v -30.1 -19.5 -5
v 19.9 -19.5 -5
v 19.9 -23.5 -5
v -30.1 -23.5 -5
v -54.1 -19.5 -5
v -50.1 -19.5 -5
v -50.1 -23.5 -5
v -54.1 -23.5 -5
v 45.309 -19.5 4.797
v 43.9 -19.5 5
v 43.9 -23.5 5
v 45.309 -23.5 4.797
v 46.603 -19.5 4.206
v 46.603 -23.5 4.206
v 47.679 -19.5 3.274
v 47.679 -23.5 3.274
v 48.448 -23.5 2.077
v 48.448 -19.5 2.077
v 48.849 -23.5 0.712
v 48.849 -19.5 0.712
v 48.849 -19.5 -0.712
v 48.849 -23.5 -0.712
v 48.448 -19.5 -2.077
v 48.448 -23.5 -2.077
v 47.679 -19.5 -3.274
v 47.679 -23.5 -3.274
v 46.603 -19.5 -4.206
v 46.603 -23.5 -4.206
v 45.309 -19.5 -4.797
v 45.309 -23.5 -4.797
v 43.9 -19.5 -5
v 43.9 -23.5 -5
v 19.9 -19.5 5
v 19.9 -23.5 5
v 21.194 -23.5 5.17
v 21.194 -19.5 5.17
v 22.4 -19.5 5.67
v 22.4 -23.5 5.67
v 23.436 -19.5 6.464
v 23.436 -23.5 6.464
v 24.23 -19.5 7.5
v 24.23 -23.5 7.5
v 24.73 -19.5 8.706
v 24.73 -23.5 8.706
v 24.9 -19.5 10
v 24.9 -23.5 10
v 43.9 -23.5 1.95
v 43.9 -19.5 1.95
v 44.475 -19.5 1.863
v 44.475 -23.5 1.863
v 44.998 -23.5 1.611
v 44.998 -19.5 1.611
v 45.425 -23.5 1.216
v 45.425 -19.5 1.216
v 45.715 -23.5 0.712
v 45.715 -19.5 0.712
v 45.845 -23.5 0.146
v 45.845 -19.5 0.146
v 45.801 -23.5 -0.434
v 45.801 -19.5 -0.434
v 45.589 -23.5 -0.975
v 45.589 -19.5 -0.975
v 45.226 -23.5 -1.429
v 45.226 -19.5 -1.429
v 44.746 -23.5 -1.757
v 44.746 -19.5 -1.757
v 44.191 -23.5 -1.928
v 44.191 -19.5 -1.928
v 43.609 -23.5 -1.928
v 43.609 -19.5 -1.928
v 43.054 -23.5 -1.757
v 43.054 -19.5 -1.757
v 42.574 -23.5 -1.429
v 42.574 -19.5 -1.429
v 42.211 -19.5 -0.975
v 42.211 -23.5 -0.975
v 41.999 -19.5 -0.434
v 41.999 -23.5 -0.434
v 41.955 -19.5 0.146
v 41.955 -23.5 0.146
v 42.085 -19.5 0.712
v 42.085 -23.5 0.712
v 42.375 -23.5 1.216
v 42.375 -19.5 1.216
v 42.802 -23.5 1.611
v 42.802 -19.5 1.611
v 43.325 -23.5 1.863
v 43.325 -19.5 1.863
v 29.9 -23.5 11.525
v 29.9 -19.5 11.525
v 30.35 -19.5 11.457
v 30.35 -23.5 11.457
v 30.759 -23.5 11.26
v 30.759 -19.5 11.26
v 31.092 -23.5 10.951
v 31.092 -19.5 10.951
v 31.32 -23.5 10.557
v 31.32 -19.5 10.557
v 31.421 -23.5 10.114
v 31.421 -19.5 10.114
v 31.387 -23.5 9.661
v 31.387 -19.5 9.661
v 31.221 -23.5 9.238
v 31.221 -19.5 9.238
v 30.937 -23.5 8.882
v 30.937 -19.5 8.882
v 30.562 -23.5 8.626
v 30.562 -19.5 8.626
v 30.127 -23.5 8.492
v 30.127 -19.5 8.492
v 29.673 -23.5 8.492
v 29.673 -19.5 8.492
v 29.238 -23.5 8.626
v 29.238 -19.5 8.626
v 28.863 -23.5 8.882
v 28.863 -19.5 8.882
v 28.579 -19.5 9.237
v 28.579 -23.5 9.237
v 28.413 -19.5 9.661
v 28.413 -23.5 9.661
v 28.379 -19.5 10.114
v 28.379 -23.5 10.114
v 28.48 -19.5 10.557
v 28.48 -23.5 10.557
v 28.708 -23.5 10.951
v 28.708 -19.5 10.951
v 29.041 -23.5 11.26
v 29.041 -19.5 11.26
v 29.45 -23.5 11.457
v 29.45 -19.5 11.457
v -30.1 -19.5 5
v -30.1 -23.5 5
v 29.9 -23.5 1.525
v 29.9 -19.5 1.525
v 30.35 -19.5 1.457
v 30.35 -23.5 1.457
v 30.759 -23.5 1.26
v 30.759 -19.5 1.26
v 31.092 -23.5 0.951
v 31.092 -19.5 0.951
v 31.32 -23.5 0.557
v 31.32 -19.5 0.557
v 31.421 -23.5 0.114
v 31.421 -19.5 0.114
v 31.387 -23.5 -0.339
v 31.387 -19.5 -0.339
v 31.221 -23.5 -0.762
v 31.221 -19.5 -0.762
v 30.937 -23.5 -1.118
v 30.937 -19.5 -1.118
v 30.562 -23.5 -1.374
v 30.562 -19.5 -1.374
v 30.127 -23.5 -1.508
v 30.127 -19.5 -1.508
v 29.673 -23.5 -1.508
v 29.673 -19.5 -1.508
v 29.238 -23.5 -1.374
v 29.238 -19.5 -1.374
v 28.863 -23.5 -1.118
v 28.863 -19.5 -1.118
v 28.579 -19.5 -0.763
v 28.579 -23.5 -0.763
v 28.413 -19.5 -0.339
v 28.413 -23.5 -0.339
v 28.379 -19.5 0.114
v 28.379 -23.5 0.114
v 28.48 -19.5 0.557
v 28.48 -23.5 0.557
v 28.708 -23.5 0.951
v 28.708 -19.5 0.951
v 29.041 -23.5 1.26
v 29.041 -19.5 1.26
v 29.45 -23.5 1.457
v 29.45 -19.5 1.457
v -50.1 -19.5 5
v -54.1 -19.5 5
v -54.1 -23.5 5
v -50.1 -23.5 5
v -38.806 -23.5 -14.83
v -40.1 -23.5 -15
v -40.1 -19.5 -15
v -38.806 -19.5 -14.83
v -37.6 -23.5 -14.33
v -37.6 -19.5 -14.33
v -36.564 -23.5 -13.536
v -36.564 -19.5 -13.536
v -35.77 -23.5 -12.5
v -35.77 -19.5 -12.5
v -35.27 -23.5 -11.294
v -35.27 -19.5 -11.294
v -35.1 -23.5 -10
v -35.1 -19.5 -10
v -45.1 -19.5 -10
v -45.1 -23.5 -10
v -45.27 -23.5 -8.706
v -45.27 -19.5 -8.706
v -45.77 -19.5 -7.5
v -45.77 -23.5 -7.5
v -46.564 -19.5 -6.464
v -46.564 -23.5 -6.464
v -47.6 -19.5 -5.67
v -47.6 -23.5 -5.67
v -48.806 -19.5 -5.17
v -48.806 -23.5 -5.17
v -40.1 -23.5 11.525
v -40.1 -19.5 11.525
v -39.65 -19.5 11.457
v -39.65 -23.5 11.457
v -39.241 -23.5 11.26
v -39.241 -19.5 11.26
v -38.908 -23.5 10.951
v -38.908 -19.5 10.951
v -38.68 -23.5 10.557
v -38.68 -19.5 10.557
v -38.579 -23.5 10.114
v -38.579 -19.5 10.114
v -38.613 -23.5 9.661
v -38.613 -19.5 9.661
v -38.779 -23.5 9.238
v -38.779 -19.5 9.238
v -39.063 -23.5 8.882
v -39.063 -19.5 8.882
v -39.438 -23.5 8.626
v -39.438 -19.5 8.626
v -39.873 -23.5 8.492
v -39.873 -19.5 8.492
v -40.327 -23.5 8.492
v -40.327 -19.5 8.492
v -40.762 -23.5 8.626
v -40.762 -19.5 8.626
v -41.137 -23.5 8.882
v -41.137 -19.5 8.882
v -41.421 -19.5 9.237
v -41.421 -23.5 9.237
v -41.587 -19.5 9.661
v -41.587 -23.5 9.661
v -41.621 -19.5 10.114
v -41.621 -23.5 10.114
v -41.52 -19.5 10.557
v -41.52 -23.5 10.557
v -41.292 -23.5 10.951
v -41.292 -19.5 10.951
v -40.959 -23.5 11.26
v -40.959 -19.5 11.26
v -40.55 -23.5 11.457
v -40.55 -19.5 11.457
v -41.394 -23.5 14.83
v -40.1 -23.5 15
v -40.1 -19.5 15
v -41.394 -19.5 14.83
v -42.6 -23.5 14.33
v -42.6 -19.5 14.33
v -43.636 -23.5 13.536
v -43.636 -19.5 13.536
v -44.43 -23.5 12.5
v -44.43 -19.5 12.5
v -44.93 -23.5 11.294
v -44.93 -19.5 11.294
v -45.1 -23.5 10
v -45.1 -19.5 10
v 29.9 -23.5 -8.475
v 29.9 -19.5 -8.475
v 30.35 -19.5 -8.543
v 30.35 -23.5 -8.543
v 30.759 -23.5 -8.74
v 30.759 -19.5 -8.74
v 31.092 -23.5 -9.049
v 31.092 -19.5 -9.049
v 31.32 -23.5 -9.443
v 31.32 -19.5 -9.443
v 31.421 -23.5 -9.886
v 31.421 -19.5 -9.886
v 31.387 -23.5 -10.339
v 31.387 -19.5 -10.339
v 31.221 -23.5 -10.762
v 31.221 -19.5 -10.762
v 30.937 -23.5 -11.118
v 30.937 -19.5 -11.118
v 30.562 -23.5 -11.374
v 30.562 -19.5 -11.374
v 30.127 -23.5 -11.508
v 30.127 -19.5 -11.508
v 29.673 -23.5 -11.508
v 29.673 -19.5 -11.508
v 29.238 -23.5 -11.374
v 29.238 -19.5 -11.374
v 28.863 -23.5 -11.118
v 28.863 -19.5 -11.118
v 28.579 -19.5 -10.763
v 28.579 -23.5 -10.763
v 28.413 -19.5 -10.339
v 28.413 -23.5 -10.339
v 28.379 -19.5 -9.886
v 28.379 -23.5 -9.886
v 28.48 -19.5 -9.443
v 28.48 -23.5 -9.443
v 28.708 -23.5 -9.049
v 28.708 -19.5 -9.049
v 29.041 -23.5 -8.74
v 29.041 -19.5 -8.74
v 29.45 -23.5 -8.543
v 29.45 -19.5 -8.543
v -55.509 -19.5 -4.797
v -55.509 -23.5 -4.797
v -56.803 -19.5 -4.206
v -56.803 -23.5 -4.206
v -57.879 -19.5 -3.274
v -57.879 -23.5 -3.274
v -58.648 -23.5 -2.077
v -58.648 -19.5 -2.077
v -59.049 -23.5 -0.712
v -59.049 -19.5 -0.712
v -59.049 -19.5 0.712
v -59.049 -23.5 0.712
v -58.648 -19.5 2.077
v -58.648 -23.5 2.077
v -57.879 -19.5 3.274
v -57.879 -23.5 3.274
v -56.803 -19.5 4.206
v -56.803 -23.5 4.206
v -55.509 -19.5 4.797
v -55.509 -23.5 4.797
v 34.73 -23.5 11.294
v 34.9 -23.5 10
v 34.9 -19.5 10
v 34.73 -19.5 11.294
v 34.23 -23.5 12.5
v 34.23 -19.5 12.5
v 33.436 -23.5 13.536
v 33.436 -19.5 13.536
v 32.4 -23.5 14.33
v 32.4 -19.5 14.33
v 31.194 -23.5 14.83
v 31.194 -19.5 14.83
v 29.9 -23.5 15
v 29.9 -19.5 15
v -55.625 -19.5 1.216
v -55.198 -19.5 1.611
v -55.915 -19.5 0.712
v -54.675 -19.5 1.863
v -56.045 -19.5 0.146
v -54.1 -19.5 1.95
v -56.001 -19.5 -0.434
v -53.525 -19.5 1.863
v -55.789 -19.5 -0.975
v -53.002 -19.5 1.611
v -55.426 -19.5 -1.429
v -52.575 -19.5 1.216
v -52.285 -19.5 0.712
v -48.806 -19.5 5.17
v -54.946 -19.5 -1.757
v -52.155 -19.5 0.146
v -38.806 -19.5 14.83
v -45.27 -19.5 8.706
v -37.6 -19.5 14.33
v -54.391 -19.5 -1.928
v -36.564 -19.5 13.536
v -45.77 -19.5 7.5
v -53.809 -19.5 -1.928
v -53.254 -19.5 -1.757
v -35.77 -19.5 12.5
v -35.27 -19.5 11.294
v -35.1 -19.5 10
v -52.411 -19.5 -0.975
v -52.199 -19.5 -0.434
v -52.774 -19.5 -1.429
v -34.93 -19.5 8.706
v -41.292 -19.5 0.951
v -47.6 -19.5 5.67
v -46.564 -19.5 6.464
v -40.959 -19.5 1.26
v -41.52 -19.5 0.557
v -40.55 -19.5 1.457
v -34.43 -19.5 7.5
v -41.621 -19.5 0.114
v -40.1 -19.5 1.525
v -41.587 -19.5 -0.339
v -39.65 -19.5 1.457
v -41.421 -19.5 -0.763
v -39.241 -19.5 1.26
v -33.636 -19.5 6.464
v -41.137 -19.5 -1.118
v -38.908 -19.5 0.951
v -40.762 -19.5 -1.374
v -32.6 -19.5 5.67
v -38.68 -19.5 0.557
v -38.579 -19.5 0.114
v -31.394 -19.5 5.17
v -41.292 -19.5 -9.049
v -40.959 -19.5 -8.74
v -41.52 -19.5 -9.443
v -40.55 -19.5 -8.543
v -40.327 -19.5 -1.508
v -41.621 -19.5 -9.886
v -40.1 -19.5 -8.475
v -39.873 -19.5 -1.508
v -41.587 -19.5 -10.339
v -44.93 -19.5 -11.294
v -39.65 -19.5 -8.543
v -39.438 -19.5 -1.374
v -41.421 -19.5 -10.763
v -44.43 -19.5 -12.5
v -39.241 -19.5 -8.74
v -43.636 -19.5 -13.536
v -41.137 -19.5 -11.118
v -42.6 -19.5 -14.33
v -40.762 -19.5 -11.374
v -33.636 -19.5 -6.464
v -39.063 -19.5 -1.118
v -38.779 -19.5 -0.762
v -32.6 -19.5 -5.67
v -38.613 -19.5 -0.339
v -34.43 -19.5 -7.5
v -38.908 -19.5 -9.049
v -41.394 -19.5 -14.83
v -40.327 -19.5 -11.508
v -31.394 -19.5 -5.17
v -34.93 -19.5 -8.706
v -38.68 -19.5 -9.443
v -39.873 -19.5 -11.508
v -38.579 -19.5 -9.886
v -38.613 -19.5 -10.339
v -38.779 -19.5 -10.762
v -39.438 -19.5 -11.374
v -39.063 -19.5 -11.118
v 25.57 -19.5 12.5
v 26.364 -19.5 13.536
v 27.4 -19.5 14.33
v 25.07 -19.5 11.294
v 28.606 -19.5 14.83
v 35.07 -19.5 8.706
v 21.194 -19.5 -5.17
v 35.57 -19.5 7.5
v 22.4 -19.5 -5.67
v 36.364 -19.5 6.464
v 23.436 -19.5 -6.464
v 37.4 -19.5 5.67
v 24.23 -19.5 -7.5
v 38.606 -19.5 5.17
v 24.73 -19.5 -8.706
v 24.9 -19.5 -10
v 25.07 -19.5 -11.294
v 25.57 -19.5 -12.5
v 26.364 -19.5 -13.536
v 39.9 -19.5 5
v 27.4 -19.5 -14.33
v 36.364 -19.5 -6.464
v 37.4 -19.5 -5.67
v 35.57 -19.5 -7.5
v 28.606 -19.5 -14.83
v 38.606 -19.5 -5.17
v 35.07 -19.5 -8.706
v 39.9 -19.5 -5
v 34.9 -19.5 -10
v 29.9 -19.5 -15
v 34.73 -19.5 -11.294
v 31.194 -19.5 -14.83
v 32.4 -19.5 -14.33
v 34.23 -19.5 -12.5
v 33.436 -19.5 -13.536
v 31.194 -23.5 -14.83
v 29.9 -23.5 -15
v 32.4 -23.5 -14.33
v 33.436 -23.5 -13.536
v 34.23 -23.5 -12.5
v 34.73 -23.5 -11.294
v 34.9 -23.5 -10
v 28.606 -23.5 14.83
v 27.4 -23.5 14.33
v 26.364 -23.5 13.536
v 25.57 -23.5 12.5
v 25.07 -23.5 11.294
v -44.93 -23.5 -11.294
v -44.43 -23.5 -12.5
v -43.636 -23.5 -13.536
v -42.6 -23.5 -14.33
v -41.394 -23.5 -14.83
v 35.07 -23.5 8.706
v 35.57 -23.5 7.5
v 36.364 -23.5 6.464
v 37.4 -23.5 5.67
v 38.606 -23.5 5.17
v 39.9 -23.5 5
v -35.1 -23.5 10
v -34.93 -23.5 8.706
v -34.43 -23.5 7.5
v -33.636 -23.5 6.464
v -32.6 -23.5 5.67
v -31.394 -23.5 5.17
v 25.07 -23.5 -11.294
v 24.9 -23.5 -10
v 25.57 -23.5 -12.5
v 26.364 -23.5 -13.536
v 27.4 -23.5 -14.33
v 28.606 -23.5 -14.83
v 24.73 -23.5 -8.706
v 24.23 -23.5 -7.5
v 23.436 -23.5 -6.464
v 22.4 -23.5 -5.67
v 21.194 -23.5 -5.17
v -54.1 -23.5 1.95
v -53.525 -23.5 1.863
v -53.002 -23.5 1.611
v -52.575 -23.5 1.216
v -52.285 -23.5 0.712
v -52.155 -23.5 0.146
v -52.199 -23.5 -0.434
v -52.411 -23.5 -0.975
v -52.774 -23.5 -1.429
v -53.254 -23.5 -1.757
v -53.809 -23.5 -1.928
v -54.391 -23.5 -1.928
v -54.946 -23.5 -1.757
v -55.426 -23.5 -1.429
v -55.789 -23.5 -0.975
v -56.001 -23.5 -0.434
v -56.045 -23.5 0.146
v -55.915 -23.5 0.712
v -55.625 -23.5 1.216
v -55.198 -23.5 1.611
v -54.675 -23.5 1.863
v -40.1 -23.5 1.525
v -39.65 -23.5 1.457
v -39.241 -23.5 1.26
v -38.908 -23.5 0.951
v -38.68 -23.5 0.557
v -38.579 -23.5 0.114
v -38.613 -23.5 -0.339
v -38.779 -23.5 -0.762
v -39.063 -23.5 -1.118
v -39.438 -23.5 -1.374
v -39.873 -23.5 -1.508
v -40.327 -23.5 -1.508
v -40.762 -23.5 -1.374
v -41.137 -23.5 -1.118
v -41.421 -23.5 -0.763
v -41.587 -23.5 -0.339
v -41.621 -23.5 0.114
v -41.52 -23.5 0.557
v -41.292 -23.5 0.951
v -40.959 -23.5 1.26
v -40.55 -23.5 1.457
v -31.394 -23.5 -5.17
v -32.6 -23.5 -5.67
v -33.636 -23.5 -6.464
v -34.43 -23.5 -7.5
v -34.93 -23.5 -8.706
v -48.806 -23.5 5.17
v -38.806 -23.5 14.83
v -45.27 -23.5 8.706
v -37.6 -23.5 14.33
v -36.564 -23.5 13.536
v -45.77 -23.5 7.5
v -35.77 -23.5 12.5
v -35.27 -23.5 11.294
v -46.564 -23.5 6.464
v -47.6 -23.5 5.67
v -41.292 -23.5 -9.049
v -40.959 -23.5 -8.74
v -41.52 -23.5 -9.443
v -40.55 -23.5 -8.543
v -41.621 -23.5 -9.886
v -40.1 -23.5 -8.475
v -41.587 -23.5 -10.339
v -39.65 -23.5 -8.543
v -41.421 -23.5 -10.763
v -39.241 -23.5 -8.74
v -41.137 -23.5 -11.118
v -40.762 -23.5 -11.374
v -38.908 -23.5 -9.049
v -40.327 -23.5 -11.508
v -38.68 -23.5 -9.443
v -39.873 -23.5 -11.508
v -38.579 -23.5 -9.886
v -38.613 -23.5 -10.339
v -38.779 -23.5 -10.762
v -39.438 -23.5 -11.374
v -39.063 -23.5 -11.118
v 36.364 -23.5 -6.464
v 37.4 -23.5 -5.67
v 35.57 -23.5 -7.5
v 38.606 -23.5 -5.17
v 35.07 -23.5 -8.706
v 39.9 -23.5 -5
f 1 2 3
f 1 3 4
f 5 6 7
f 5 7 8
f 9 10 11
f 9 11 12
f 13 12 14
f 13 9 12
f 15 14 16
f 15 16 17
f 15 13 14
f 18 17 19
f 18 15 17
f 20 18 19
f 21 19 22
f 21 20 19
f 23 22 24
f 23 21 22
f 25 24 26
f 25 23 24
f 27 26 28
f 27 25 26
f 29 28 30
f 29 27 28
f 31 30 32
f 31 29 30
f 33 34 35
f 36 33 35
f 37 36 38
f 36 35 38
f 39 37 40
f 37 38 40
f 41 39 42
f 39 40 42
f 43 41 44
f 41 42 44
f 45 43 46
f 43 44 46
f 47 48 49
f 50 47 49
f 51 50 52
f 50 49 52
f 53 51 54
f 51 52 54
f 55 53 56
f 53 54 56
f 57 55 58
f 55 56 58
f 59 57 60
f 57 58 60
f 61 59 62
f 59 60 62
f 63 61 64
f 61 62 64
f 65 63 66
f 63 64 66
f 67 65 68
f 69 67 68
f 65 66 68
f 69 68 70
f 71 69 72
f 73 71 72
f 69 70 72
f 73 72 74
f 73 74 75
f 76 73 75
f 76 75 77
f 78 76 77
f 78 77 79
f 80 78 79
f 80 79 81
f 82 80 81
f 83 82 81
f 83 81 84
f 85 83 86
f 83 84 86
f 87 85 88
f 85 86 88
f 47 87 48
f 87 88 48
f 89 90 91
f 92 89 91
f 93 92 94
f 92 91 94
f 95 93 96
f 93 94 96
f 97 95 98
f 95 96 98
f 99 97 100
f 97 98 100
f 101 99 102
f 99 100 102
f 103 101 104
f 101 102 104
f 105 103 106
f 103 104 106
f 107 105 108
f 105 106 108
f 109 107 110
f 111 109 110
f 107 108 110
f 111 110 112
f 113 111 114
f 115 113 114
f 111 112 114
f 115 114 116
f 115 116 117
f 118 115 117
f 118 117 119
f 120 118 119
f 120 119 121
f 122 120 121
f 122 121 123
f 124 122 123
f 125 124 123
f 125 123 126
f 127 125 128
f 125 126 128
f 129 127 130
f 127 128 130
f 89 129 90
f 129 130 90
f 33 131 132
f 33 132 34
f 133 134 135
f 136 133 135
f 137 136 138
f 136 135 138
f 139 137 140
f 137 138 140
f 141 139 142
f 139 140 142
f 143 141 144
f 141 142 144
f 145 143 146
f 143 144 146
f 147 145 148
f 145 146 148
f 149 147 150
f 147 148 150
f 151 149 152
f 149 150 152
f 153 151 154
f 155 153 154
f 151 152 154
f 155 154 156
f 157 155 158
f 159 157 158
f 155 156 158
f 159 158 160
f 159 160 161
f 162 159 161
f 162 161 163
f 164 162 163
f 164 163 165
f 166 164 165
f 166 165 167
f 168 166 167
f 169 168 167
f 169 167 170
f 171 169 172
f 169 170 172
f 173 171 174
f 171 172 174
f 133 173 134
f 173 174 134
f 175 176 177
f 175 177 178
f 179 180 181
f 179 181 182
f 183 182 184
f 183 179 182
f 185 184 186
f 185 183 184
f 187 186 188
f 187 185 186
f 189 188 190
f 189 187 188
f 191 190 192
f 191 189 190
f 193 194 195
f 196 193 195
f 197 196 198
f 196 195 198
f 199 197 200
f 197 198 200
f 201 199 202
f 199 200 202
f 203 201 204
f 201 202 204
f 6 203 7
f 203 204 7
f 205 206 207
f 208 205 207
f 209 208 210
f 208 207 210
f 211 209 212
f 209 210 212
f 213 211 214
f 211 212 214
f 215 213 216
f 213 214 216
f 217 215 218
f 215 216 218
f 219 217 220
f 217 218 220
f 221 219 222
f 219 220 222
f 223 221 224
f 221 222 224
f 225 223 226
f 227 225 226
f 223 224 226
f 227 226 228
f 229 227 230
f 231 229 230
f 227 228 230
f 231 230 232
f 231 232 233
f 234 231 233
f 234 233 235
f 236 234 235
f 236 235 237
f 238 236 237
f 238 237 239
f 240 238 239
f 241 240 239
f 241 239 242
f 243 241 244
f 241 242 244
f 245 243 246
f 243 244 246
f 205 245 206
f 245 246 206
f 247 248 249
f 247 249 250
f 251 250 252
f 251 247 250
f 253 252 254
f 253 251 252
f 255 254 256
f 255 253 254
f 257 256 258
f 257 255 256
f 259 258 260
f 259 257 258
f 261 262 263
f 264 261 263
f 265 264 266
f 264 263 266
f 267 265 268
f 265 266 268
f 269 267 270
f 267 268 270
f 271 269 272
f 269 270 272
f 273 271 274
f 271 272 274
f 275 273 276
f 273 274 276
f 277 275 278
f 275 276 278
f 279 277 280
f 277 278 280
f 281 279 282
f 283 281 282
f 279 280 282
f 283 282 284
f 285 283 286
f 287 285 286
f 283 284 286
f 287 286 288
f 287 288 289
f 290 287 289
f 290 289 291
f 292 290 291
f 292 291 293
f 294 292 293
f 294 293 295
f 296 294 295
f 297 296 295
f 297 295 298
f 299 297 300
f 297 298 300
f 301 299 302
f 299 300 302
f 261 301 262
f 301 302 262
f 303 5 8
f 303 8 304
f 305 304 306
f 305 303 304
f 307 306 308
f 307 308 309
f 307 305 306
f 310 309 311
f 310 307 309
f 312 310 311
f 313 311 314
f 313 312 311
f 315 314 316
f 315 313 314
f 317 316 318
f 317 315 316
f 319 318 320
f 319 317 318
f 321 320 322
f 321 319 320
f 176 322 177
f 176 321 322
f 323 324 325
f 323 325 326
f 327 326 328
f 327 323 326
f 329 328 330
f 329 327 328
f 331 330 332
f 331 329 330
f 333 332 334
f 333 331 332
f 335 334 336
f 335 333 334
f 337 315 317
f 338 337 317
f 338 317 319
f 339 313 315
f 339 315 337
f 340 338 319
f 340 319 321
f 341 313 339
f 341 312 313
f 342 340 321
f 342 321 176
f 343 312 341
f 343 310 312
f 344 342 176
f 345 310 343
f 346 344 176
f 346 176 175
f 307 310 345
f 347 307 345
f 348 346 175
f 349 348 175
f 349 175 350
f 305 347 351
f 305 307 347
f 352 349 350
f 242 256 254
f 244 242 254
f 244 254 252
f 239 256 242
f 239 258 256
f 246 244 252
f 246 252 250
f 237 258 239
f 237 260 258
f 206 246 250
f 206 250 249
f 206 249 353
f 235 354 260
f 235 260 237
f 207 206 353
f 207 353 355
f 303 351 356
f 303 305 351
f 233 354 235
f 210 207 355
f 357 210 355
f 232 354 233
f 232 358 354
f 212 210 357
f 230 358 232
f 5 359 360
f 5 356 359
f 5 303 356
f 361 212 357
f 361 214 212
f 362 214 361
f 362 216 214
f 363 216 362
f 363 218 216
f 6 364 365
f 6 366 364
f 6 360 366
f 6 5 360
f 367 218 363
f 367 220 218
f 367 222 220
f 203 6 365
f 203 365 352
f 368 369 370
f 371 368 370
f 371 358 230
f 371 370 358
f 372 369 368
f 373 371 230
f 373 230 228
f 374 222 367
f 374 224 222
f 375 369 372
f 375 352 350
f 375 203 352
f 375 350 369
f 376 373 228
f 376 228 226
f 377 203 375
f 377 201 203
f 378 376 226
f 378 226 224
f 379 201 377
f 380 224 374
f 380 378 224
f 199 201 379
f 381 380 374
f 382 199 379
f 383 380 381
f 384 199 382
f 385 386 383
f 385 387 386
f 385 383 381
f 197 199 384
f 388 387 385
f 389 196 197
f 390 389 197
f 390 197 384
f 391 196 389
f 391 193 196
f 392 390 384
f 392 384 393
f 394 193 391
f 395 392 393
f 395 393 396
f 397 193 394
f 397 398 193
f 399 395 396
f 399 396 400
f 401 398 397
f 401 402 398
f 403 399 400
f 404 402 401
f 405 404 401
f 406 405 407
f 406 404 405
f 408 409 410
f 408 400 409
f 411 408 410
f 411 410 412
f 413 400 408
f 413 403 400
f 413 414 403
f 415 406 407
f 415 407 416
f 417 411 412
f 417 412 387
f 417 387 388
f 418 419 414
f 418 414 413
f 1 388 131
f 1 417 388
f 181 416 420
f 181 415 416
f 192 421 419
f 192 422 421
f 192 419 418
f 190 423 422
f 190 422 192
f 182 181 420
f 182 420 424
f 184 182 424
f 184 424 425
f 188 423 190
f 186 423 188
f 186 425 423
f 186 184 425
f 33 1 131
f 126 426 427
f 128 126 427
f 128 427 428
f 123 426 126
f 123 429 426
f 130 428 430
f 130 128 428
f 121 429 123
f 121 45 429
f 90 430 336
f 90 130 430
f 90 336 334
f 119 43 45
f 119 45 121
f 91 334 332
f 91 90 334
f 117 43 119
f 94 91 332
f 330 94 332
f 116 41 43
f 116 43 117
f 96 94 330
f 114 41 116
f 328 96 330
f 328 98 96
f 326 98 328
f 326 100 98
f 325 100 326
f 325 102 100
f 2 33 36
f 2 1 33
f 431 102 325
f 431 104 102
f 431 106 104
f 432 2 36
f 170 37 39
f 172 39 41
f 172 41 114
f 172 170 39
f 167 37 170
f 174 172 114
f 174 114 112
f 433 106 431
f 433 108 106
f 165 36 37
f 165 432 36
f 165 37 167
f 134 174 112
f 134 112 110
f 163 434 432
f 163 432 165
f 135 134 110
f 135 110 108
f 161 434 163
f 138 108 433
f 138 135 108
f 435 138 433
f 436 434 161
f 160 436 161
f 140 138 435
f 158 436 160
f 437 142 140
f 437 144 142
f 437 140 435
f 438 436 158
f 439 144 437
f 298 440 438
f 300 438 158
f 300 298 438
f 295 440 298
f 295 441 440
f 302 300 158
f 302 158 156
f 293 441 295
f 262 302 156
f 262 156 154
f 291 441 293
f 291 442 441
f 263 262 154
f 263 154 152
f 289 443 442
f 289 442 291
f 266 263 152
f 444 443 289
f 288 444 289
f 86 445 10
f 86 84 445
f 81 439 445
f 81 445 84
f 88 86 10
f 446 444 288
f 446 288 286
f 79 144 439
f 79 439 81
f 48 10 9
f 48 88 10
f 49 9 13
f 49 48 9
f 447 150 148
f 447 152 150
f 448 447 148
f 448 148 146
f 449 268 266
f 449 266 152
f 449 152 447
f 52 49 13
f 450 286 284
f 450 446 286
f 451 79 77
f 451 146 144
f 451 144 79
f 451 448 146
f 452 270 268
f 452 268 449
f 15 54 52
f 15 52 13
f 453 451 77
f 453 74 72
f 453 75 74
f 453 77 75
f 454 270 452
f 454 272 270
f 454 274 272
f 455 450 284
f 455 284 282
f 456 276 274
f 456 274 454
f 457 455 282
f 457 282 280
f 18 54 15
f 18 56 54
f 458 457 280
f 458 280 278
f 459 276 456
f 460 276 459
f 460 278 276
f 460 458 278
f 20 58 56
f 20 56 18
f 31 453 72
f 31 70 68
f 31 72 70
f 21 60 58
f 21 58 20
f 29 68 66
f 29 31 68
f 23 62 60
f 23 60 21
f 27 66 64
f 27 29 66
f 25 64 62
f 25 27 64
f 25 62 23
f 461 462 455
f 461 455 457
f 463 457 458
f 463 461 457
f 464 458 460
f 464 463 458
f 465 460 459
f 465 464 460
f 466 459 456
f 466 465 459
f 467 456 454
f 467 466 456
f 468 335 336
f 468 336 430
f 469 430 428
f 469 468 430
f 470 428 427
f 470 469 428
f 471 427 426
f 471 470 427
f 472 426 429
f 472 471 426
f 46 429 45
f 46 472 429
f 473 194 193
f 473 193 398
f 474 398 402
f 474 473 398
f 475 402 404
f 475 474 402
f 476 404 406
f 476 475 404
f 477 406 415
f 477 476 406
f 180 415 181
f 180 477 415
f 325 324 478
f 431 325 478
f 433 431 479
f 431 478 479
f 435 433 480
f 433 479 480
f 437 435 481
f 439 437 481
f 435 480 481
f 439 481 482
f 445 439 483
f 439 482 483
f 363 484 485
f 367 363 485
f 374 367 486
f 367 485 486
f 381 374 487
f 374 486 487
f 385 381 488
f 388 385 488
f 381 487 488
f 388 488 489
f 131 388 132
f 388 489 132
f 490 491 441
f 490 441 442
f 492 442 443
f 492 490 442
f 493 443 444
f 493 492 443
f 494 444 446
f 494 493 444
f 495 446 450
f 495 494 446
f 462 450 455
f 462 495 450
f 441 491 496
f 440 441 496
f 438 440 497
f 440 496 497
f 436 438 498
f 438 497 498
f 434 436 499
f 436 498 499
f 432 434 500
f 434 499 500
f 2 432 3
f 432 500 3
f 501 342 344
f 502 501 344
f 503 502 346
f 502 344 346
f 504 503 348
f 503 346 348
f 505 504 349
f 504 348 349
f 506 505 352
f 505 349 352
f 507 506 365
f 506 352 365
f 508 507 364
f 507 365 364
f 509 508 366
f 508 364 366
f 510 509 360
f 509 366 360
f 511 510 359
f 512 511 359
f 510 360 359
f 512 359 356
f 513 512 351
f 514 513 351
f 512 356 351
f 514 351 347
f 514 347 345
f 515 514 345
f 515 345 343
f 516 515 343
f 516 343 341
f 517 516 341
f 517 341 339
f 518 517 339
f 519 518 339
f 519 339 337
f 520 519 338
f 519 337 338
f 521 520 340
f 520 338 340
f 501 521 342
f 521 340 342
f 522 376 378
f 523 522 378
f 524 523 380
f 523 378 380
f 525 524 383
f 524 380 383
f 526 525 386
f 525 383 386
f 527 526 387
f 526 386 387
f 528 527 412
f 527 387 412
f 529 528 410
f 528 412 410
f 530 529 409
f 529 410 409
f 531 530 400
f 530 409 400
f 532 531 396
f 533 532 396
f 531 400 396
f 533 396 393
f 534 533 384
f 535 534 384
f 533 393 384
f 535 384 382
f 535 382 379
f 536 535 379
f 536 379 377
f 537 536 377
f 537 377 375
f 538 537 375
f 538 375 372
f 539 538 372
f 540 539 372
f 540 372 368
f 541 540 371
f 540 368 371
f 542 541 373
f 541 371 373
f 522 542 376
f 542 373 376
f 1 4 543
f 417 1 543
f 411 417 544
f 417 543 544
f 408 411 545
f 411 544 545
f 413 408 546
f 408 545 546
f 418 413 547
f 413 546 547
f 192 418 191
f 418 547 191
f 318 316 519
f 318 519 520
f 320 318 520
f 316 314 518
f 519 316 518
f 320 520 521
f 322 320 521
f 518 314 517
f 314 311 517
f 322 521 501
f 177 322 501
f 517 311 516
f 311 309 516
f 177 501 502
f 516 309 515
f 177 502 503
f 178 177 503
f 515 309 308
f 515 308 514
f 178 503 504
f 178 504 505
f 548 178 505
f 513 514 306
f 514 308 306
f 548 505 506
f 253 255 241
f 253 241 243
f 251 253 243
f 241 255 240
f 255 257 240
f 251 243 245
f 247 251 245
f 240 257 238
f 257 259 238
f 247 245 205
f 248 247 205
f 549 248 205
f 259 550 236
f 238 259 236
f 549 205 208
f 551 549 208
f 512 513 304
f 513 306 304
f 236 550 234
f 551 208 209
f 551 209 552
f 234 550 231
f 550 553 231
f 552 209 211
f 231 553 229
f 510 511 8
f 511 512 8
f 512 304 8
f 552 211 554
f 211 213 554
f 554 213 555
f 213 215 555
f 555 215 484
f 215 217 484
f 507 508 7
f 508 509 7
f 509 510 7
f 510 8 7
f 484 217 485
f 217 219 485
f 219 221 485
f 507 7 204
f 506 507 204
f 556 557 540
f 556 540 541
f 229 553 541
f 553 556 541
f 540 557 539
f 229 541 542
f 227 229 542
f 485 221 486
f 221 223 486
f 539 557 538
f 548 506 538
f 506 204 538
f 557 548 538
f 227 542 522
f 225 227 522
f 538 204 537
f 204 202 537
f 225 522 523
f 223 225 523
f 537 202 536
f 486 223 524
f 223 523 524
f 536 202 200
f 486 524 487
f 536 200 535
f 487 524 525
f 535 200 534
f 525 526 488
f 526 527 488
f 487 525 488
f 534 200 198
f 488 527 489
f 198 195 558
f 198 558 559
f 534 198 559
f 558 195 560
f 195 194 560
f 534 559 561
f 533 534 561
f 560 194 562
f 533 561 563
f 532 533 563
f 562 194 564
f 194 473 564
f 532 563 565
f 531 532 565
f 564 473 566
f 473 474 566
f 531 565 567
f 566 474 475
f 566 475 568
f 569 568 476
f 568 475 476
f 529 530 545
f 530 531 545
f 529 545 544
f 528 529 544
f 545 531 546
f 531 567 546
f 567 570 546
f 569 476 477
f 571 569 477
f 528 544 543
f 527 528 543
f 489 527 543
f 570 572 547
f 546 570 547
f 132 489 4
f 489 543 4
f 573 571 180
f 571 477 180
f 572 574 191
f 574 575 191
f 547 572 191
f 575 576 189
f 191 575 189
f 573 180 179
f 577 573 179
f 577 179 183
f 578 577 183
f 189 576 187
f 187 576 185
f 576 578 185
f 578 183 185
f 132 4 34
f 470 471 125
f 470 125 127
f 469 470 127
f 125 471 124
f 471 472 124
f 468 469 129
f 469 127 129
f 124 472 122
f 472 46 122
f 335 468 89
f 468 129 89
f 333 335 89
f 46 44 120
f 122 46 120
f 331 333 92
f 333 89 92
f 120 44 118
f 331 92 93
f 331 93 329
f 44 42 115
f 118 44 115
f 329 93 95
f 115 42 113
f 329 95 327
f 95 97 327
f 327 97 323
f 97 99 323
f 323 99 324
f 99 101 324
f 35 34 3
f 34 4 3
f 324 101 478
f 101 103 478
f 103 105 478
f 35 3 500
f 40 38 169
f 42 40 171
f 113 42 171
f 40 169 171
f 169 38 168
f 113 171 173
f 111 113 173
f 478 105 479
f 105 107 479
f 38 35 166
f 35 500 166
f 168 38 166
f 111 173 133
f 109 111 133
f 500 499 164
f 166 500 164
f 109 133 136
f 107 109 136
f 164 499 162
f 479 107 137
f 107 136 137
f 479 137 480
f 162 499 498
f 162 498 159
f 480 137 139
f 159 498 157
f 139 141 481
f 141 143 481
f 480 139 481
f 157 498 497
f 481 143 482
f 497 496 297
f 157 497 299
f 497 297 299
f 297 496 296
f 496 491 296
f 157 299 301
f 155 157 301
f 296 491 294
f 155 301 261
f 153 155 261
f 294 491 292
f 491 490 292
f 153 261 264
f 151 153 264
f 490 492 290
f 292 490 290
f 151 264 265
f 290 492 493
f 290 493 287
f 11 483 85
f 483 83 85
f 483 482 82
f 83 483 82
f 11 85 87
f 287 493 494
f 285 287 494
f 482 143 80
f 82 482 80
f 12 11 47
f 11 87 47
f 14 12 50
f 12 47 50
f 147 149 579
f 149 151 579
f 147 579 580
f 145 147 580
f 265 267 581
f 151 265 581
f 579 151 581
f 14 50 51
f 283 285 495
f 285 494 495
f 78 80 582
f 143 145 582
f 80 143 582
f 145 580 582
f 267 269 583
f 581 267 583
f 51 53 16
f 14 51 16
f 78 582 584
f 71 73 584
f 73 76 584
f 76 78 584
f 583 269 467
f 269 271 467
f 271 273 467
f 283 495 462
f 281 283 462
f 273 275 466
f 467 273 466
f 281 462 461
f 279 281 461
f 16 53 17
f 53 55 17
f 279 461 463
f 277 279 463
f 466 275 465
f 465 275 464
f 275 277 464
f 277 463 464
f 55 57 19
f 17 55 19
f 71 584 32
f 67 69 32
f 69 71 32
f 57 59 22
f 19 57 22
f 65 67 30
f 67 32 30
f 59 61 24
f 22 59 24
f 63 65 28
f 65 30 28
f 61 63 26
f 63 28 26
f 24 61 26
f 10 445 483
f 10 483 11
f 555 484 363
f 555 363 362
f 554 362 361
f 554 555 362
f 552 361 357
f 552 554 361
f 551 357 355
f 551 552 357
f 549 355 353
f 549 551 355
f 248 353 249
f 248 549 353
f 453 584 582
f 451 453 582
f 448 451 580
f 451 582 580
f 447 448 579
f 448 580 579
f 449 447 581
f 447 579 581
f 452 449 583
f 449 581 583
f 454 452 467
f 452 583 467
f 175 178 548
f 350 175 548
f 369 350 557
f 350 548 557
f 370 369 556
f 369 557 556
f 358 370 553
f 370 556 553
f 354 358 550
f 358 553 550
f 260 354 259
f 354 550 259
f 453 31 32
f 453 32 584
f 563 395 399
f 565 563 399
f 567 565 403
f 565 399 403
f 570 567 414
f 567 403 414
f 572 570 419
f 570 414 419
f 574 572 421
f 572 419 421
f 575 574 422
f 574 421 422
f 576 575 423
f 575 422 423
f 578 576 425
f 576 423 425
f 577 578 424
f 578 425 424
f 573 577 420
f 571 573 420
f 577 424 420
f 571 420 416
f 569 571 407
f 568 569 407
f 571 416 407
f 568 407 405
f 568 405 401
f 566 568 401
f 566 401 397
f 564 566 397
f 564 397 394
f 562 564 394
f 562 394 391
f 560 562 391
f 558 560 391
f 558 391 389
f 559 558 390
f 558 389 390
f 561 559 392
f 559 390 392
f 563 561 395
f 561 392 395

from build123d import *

# Parameters (mm, degrees)
BOSS_EXTRUDE1_START = -19.5
SKETCH1_R           = 1.95
BOSS_EXTRUDE1_DEPTH = 4
SKETCH2_W           = 10
SKETCH2_H           = 10
SKETCH2_R           = 1.525
BOSS_EXTRUDE2_DEPTH = 4
SKETCH2_3_R         = 1.525
CUT_EXTRUDE1_DEPTH  = 4
FILLET1_START       = -24
FILLET1_DEPTH       = 5
FILLET1_START_2     = -23.5
FILLET1_2_DEPTH     = 4


with BuildPart() as part:
    # Sketch1 → Boss-Extrude1 (new body)
    with BuildSketch(Plane(origin=(0, 0, 0), x_dir=(1, 0, 0), z_dir=(0, 1, 0)).offset(BOSS_EXTRUDE1_START)):
        with BuildLine():
            Line((43.9, 5), (-54.1, 5))
            ThreePointArc((-54.1, 5), (-59.1, 0), (-54.1, -5))
            Line((-54.1, -5), (43.9, -5))
            ThreePointArc((43.9, -5), (48.9, 0), (43.9, 5))
        make_face()
        with Locations(Location((43.9, 0, 0), (0, 0, 270))):
            Circle(SKETCH1_R, mode=Mode.SUBTRACT)
        with Locations(Location((-54.1, 0, 0), (0, 0, 270))):
            Circle(SKETCH1_R, mode=Mode.SUBTRACT)
    extrude(amount=-BOSS_EXTRUDE1_DEPTH)

    # Sketch2 → Boss-Extrude2 (add)
    # profile 1 of 4: a face of its own
    with BuildSketch(Plane(origin=(0, -19.5, 0), x_dir=(1, 0, 0), z_dir=(0, 1, 0))):
        with Locations((-40.1, -10)):
            Rectangle(SKETCH2_W, SKETCH2_H)
        with Locations(Location((-40.1, -10, 0), (0, 0, 270))):
            Circle(SKETCH2_R, mode=Mode.SUBTRACT)
    # profile 2 of 4: a face of its own
    with BuildSketch(Plane(origin=(0, -19.5, 0), x_dir=(1, 0, 0), z_dir=(0, 1, 0))):
        with Locations((-40.1, 10)):
            Rectangle(SKETCH2_W, SKETCH2_H)
        with Locations(Location((-40.1, 10, 0), (0, 0, 270))):
            Circle(SKETCH2_R, mode=Mode.SUBTRACT)
    # profile 3 of 4: a face of its own
    with BuildSketch(Plane(origin=(0, -19.5, 0), x_dir=(1, 0, 0), z_dir=(0, 1, 0))):
        with Locations((29.9, 10)):
            Rectangle(SKETCH2_W, SKETCH2_H)
        with Locations(Location((29.9, 10, 0), (0, 0, 270))):
            Circle(SKETCH2_R, mode=Mode.SUBTRACT)
    # profile 4 of 4: a face of its own
    with BuildSketch(Plane(origin=(0, -19.5, 0), x_dir=(1, 0, 0), z_dir=(0, 1, 0))):
        with Locations((29.9, -10)):
            Rectangle(SKETCH2_W, SKETCH2_H)
        with Locations(Location((29.9, -10, 0), (0, 0, 270))):
            Circle(SKETCH2_R, mode=Mode.SUBTRACT)
    extrude(amount=-BOSS_EXTRUDE2_DEPTH)

    # Sketch2<3> → Cut-Extrude1 (cut)
    with BuildSketch(Plane(origin=(0, -19.5, 0), x_dir=(1, 0, 0), z_dir=(0, 1, 0))):
        with Locations(Location((29.9, 0, 0), (0, 0, 270))):
            Circle(SKETCH2_3_R)
        with Locations(Location((-40.1, 0, 0), (0, 0, 270))):
            Circle(SKETCH2_3_R)
    extrude(amount=-CUT_EXTRUDE1_DEPTH, mode=Mode.SUBTRACT)

    # Fillet1: read off the stored shape, not the designer's step
    # Fillet1 outline → Fillet1 (cut)
    with BuildSketch(Plane(origin=(0, 0, 0), x_dir=(1, 0, 0), z_dir=(0, 1, 0)).offset(FILLET1_START)):
        with BuildLine():
            Line((34.9, -15), (34.9, -10))
            ThreePointArc((34.9, -10), (33.435533906, -13.535533906), (29.9, -15))
            Line((29.9, -15), (34.9, -15))
        make_face()
        with BuildLine():
            Line((-45.1, -15), (-40.1, -15))
            ThreePointArc((-40.1, -15), (-43.635533906, -13.535533906), (-45.1, -10))
            Line((-45.1, -10), (-45.1, -15))
        make_face()
        with BuildLine():
            Line((-35.1, -15), (-35.1, -10))
            ThreePointArc((-35.1, -10), (-36.564466094, -13.535533906), (-40.1, -15))
            Line((-40.1, -15), (-35.1, -15))
        make_face()
        with BuildLine():
            Line((24.9, -15), (29.9, -15))
            ThreePointArc((29.9, -15), (26.364466094, -13.535533906), (24.9, -10))
            Line((24.9, -10), (24.9, -15))
        make_face()
        with BuildLine():
            Line((34.9, 15), (29.9, 15))
            ThreePointArc((29.9, 15), (33.435533906, 13.535533906), (34.9, 10))
            Line((34.9, 10), (34.9, 15))
        make_face()
        with BuildLine():
            Line((24.9, 15), (24.9, 10))
            ThreePointArc((24.9, 10), (26.364466094, 13.535533906), (29.9, 15))
            Line((29.9, 15), (24.9, 15))
        make_face()
        with BuildLine():
            ThreePointArc((-45.1, 10), (-43.635533906, 13.535533906), (-40.1, 15))
            Line((-40.1, 15), (-45.1, 15))
            Line((-45.1, 15), (-45.1, 10))
        make_face()
        with BuildLine():
            ThreePointArc((-40.1, 15), (-36.564466094, 13.535533906), (-35.1, 10))
            Line((-35.1, 10), (-35.1, 15))
            Line((-35.1, 15), (-40.1, 15))
        make_face()
    extrude(amount=FILLET1_DEPTH, mode=Mode.SUBTRACT)

    # Fillet1 2 outline → Fillet1 2 (add)
    with BuildSketch(Plane(origin=(0, 0, 0), x_dir=(1, 0, 0), z_dir=(0, 1, 0)).offset(FILLET1_START_2)):
        with BuildLine():
            Line((34.9, -5), (34.9, -10))
            ThreePointArc((34.9, -10), (36.364466094, -6.464466094), (39.9, -5))
            Line((39.9, -5), (34.9, -5))
        make_face()
        with BuildLine():
            ThreePointArc((-50.1, -5), (-46.564466094, -6.464466094), (-45.1, -10))
            Line((-45.1, -10), (-45.1, -5))
            Line((-45.1, -5), (-50.1, -5))
        make_face()
        with BuildLine():
            ThreePointArc((-35.1, -10), (-33.635533906, -6.464466094), (-30.1, -5))
            Line((-30.1, -5), (-35.1, -5))
            Line((-35.1, -5), (-35.1, -10))
        make_face()
        with BuildLine():
            ThreePointArc((19.9, -5), (23.435533906, -6.464466094), (24.9, -10))
            Line((24.9, -10), (24.9, -5))
            Line((24.9, -5), (19.9, -5))
        make_face()
        with BuildLine():
            ThreePointArc((39.9, 5), (36.364466094, 6.464466094), (34.9, 10))
            Line((34.9, 10), (34.9, 5))
            Line((34.9, 5), (39.9, 5))
        make_face()
        with BuildLine():
            Line((-45.1, 5), (-45.1, 10))
            ThreePointArc((-45.1, 10), (-46.564466094, 6.464466094), (-50.1, 5))
            Line((-50.1, 5), (-45.1, 5))
        make_face()
        with BuildLine():
            Line((-35.1, 5), (-30.1, 5))
            ThreePointArc((-30.1, 5), (-33.635533906, 6.464466094), (-35.1, 10))
            Line((-35.1, 10), (-35.1, 5))
        make_face()
        with BuildLine():
            ThreePointArc((24.9, 10), (23.435533906, 6.464466094), (19.9, 5))
            Line((19.9, 5), (24.9, 5))
            Line((24.9, 5), (24.9, 10))
        make_face()
    extrude(amount=FILLET1_2_DEPTH)


solid = part.part
